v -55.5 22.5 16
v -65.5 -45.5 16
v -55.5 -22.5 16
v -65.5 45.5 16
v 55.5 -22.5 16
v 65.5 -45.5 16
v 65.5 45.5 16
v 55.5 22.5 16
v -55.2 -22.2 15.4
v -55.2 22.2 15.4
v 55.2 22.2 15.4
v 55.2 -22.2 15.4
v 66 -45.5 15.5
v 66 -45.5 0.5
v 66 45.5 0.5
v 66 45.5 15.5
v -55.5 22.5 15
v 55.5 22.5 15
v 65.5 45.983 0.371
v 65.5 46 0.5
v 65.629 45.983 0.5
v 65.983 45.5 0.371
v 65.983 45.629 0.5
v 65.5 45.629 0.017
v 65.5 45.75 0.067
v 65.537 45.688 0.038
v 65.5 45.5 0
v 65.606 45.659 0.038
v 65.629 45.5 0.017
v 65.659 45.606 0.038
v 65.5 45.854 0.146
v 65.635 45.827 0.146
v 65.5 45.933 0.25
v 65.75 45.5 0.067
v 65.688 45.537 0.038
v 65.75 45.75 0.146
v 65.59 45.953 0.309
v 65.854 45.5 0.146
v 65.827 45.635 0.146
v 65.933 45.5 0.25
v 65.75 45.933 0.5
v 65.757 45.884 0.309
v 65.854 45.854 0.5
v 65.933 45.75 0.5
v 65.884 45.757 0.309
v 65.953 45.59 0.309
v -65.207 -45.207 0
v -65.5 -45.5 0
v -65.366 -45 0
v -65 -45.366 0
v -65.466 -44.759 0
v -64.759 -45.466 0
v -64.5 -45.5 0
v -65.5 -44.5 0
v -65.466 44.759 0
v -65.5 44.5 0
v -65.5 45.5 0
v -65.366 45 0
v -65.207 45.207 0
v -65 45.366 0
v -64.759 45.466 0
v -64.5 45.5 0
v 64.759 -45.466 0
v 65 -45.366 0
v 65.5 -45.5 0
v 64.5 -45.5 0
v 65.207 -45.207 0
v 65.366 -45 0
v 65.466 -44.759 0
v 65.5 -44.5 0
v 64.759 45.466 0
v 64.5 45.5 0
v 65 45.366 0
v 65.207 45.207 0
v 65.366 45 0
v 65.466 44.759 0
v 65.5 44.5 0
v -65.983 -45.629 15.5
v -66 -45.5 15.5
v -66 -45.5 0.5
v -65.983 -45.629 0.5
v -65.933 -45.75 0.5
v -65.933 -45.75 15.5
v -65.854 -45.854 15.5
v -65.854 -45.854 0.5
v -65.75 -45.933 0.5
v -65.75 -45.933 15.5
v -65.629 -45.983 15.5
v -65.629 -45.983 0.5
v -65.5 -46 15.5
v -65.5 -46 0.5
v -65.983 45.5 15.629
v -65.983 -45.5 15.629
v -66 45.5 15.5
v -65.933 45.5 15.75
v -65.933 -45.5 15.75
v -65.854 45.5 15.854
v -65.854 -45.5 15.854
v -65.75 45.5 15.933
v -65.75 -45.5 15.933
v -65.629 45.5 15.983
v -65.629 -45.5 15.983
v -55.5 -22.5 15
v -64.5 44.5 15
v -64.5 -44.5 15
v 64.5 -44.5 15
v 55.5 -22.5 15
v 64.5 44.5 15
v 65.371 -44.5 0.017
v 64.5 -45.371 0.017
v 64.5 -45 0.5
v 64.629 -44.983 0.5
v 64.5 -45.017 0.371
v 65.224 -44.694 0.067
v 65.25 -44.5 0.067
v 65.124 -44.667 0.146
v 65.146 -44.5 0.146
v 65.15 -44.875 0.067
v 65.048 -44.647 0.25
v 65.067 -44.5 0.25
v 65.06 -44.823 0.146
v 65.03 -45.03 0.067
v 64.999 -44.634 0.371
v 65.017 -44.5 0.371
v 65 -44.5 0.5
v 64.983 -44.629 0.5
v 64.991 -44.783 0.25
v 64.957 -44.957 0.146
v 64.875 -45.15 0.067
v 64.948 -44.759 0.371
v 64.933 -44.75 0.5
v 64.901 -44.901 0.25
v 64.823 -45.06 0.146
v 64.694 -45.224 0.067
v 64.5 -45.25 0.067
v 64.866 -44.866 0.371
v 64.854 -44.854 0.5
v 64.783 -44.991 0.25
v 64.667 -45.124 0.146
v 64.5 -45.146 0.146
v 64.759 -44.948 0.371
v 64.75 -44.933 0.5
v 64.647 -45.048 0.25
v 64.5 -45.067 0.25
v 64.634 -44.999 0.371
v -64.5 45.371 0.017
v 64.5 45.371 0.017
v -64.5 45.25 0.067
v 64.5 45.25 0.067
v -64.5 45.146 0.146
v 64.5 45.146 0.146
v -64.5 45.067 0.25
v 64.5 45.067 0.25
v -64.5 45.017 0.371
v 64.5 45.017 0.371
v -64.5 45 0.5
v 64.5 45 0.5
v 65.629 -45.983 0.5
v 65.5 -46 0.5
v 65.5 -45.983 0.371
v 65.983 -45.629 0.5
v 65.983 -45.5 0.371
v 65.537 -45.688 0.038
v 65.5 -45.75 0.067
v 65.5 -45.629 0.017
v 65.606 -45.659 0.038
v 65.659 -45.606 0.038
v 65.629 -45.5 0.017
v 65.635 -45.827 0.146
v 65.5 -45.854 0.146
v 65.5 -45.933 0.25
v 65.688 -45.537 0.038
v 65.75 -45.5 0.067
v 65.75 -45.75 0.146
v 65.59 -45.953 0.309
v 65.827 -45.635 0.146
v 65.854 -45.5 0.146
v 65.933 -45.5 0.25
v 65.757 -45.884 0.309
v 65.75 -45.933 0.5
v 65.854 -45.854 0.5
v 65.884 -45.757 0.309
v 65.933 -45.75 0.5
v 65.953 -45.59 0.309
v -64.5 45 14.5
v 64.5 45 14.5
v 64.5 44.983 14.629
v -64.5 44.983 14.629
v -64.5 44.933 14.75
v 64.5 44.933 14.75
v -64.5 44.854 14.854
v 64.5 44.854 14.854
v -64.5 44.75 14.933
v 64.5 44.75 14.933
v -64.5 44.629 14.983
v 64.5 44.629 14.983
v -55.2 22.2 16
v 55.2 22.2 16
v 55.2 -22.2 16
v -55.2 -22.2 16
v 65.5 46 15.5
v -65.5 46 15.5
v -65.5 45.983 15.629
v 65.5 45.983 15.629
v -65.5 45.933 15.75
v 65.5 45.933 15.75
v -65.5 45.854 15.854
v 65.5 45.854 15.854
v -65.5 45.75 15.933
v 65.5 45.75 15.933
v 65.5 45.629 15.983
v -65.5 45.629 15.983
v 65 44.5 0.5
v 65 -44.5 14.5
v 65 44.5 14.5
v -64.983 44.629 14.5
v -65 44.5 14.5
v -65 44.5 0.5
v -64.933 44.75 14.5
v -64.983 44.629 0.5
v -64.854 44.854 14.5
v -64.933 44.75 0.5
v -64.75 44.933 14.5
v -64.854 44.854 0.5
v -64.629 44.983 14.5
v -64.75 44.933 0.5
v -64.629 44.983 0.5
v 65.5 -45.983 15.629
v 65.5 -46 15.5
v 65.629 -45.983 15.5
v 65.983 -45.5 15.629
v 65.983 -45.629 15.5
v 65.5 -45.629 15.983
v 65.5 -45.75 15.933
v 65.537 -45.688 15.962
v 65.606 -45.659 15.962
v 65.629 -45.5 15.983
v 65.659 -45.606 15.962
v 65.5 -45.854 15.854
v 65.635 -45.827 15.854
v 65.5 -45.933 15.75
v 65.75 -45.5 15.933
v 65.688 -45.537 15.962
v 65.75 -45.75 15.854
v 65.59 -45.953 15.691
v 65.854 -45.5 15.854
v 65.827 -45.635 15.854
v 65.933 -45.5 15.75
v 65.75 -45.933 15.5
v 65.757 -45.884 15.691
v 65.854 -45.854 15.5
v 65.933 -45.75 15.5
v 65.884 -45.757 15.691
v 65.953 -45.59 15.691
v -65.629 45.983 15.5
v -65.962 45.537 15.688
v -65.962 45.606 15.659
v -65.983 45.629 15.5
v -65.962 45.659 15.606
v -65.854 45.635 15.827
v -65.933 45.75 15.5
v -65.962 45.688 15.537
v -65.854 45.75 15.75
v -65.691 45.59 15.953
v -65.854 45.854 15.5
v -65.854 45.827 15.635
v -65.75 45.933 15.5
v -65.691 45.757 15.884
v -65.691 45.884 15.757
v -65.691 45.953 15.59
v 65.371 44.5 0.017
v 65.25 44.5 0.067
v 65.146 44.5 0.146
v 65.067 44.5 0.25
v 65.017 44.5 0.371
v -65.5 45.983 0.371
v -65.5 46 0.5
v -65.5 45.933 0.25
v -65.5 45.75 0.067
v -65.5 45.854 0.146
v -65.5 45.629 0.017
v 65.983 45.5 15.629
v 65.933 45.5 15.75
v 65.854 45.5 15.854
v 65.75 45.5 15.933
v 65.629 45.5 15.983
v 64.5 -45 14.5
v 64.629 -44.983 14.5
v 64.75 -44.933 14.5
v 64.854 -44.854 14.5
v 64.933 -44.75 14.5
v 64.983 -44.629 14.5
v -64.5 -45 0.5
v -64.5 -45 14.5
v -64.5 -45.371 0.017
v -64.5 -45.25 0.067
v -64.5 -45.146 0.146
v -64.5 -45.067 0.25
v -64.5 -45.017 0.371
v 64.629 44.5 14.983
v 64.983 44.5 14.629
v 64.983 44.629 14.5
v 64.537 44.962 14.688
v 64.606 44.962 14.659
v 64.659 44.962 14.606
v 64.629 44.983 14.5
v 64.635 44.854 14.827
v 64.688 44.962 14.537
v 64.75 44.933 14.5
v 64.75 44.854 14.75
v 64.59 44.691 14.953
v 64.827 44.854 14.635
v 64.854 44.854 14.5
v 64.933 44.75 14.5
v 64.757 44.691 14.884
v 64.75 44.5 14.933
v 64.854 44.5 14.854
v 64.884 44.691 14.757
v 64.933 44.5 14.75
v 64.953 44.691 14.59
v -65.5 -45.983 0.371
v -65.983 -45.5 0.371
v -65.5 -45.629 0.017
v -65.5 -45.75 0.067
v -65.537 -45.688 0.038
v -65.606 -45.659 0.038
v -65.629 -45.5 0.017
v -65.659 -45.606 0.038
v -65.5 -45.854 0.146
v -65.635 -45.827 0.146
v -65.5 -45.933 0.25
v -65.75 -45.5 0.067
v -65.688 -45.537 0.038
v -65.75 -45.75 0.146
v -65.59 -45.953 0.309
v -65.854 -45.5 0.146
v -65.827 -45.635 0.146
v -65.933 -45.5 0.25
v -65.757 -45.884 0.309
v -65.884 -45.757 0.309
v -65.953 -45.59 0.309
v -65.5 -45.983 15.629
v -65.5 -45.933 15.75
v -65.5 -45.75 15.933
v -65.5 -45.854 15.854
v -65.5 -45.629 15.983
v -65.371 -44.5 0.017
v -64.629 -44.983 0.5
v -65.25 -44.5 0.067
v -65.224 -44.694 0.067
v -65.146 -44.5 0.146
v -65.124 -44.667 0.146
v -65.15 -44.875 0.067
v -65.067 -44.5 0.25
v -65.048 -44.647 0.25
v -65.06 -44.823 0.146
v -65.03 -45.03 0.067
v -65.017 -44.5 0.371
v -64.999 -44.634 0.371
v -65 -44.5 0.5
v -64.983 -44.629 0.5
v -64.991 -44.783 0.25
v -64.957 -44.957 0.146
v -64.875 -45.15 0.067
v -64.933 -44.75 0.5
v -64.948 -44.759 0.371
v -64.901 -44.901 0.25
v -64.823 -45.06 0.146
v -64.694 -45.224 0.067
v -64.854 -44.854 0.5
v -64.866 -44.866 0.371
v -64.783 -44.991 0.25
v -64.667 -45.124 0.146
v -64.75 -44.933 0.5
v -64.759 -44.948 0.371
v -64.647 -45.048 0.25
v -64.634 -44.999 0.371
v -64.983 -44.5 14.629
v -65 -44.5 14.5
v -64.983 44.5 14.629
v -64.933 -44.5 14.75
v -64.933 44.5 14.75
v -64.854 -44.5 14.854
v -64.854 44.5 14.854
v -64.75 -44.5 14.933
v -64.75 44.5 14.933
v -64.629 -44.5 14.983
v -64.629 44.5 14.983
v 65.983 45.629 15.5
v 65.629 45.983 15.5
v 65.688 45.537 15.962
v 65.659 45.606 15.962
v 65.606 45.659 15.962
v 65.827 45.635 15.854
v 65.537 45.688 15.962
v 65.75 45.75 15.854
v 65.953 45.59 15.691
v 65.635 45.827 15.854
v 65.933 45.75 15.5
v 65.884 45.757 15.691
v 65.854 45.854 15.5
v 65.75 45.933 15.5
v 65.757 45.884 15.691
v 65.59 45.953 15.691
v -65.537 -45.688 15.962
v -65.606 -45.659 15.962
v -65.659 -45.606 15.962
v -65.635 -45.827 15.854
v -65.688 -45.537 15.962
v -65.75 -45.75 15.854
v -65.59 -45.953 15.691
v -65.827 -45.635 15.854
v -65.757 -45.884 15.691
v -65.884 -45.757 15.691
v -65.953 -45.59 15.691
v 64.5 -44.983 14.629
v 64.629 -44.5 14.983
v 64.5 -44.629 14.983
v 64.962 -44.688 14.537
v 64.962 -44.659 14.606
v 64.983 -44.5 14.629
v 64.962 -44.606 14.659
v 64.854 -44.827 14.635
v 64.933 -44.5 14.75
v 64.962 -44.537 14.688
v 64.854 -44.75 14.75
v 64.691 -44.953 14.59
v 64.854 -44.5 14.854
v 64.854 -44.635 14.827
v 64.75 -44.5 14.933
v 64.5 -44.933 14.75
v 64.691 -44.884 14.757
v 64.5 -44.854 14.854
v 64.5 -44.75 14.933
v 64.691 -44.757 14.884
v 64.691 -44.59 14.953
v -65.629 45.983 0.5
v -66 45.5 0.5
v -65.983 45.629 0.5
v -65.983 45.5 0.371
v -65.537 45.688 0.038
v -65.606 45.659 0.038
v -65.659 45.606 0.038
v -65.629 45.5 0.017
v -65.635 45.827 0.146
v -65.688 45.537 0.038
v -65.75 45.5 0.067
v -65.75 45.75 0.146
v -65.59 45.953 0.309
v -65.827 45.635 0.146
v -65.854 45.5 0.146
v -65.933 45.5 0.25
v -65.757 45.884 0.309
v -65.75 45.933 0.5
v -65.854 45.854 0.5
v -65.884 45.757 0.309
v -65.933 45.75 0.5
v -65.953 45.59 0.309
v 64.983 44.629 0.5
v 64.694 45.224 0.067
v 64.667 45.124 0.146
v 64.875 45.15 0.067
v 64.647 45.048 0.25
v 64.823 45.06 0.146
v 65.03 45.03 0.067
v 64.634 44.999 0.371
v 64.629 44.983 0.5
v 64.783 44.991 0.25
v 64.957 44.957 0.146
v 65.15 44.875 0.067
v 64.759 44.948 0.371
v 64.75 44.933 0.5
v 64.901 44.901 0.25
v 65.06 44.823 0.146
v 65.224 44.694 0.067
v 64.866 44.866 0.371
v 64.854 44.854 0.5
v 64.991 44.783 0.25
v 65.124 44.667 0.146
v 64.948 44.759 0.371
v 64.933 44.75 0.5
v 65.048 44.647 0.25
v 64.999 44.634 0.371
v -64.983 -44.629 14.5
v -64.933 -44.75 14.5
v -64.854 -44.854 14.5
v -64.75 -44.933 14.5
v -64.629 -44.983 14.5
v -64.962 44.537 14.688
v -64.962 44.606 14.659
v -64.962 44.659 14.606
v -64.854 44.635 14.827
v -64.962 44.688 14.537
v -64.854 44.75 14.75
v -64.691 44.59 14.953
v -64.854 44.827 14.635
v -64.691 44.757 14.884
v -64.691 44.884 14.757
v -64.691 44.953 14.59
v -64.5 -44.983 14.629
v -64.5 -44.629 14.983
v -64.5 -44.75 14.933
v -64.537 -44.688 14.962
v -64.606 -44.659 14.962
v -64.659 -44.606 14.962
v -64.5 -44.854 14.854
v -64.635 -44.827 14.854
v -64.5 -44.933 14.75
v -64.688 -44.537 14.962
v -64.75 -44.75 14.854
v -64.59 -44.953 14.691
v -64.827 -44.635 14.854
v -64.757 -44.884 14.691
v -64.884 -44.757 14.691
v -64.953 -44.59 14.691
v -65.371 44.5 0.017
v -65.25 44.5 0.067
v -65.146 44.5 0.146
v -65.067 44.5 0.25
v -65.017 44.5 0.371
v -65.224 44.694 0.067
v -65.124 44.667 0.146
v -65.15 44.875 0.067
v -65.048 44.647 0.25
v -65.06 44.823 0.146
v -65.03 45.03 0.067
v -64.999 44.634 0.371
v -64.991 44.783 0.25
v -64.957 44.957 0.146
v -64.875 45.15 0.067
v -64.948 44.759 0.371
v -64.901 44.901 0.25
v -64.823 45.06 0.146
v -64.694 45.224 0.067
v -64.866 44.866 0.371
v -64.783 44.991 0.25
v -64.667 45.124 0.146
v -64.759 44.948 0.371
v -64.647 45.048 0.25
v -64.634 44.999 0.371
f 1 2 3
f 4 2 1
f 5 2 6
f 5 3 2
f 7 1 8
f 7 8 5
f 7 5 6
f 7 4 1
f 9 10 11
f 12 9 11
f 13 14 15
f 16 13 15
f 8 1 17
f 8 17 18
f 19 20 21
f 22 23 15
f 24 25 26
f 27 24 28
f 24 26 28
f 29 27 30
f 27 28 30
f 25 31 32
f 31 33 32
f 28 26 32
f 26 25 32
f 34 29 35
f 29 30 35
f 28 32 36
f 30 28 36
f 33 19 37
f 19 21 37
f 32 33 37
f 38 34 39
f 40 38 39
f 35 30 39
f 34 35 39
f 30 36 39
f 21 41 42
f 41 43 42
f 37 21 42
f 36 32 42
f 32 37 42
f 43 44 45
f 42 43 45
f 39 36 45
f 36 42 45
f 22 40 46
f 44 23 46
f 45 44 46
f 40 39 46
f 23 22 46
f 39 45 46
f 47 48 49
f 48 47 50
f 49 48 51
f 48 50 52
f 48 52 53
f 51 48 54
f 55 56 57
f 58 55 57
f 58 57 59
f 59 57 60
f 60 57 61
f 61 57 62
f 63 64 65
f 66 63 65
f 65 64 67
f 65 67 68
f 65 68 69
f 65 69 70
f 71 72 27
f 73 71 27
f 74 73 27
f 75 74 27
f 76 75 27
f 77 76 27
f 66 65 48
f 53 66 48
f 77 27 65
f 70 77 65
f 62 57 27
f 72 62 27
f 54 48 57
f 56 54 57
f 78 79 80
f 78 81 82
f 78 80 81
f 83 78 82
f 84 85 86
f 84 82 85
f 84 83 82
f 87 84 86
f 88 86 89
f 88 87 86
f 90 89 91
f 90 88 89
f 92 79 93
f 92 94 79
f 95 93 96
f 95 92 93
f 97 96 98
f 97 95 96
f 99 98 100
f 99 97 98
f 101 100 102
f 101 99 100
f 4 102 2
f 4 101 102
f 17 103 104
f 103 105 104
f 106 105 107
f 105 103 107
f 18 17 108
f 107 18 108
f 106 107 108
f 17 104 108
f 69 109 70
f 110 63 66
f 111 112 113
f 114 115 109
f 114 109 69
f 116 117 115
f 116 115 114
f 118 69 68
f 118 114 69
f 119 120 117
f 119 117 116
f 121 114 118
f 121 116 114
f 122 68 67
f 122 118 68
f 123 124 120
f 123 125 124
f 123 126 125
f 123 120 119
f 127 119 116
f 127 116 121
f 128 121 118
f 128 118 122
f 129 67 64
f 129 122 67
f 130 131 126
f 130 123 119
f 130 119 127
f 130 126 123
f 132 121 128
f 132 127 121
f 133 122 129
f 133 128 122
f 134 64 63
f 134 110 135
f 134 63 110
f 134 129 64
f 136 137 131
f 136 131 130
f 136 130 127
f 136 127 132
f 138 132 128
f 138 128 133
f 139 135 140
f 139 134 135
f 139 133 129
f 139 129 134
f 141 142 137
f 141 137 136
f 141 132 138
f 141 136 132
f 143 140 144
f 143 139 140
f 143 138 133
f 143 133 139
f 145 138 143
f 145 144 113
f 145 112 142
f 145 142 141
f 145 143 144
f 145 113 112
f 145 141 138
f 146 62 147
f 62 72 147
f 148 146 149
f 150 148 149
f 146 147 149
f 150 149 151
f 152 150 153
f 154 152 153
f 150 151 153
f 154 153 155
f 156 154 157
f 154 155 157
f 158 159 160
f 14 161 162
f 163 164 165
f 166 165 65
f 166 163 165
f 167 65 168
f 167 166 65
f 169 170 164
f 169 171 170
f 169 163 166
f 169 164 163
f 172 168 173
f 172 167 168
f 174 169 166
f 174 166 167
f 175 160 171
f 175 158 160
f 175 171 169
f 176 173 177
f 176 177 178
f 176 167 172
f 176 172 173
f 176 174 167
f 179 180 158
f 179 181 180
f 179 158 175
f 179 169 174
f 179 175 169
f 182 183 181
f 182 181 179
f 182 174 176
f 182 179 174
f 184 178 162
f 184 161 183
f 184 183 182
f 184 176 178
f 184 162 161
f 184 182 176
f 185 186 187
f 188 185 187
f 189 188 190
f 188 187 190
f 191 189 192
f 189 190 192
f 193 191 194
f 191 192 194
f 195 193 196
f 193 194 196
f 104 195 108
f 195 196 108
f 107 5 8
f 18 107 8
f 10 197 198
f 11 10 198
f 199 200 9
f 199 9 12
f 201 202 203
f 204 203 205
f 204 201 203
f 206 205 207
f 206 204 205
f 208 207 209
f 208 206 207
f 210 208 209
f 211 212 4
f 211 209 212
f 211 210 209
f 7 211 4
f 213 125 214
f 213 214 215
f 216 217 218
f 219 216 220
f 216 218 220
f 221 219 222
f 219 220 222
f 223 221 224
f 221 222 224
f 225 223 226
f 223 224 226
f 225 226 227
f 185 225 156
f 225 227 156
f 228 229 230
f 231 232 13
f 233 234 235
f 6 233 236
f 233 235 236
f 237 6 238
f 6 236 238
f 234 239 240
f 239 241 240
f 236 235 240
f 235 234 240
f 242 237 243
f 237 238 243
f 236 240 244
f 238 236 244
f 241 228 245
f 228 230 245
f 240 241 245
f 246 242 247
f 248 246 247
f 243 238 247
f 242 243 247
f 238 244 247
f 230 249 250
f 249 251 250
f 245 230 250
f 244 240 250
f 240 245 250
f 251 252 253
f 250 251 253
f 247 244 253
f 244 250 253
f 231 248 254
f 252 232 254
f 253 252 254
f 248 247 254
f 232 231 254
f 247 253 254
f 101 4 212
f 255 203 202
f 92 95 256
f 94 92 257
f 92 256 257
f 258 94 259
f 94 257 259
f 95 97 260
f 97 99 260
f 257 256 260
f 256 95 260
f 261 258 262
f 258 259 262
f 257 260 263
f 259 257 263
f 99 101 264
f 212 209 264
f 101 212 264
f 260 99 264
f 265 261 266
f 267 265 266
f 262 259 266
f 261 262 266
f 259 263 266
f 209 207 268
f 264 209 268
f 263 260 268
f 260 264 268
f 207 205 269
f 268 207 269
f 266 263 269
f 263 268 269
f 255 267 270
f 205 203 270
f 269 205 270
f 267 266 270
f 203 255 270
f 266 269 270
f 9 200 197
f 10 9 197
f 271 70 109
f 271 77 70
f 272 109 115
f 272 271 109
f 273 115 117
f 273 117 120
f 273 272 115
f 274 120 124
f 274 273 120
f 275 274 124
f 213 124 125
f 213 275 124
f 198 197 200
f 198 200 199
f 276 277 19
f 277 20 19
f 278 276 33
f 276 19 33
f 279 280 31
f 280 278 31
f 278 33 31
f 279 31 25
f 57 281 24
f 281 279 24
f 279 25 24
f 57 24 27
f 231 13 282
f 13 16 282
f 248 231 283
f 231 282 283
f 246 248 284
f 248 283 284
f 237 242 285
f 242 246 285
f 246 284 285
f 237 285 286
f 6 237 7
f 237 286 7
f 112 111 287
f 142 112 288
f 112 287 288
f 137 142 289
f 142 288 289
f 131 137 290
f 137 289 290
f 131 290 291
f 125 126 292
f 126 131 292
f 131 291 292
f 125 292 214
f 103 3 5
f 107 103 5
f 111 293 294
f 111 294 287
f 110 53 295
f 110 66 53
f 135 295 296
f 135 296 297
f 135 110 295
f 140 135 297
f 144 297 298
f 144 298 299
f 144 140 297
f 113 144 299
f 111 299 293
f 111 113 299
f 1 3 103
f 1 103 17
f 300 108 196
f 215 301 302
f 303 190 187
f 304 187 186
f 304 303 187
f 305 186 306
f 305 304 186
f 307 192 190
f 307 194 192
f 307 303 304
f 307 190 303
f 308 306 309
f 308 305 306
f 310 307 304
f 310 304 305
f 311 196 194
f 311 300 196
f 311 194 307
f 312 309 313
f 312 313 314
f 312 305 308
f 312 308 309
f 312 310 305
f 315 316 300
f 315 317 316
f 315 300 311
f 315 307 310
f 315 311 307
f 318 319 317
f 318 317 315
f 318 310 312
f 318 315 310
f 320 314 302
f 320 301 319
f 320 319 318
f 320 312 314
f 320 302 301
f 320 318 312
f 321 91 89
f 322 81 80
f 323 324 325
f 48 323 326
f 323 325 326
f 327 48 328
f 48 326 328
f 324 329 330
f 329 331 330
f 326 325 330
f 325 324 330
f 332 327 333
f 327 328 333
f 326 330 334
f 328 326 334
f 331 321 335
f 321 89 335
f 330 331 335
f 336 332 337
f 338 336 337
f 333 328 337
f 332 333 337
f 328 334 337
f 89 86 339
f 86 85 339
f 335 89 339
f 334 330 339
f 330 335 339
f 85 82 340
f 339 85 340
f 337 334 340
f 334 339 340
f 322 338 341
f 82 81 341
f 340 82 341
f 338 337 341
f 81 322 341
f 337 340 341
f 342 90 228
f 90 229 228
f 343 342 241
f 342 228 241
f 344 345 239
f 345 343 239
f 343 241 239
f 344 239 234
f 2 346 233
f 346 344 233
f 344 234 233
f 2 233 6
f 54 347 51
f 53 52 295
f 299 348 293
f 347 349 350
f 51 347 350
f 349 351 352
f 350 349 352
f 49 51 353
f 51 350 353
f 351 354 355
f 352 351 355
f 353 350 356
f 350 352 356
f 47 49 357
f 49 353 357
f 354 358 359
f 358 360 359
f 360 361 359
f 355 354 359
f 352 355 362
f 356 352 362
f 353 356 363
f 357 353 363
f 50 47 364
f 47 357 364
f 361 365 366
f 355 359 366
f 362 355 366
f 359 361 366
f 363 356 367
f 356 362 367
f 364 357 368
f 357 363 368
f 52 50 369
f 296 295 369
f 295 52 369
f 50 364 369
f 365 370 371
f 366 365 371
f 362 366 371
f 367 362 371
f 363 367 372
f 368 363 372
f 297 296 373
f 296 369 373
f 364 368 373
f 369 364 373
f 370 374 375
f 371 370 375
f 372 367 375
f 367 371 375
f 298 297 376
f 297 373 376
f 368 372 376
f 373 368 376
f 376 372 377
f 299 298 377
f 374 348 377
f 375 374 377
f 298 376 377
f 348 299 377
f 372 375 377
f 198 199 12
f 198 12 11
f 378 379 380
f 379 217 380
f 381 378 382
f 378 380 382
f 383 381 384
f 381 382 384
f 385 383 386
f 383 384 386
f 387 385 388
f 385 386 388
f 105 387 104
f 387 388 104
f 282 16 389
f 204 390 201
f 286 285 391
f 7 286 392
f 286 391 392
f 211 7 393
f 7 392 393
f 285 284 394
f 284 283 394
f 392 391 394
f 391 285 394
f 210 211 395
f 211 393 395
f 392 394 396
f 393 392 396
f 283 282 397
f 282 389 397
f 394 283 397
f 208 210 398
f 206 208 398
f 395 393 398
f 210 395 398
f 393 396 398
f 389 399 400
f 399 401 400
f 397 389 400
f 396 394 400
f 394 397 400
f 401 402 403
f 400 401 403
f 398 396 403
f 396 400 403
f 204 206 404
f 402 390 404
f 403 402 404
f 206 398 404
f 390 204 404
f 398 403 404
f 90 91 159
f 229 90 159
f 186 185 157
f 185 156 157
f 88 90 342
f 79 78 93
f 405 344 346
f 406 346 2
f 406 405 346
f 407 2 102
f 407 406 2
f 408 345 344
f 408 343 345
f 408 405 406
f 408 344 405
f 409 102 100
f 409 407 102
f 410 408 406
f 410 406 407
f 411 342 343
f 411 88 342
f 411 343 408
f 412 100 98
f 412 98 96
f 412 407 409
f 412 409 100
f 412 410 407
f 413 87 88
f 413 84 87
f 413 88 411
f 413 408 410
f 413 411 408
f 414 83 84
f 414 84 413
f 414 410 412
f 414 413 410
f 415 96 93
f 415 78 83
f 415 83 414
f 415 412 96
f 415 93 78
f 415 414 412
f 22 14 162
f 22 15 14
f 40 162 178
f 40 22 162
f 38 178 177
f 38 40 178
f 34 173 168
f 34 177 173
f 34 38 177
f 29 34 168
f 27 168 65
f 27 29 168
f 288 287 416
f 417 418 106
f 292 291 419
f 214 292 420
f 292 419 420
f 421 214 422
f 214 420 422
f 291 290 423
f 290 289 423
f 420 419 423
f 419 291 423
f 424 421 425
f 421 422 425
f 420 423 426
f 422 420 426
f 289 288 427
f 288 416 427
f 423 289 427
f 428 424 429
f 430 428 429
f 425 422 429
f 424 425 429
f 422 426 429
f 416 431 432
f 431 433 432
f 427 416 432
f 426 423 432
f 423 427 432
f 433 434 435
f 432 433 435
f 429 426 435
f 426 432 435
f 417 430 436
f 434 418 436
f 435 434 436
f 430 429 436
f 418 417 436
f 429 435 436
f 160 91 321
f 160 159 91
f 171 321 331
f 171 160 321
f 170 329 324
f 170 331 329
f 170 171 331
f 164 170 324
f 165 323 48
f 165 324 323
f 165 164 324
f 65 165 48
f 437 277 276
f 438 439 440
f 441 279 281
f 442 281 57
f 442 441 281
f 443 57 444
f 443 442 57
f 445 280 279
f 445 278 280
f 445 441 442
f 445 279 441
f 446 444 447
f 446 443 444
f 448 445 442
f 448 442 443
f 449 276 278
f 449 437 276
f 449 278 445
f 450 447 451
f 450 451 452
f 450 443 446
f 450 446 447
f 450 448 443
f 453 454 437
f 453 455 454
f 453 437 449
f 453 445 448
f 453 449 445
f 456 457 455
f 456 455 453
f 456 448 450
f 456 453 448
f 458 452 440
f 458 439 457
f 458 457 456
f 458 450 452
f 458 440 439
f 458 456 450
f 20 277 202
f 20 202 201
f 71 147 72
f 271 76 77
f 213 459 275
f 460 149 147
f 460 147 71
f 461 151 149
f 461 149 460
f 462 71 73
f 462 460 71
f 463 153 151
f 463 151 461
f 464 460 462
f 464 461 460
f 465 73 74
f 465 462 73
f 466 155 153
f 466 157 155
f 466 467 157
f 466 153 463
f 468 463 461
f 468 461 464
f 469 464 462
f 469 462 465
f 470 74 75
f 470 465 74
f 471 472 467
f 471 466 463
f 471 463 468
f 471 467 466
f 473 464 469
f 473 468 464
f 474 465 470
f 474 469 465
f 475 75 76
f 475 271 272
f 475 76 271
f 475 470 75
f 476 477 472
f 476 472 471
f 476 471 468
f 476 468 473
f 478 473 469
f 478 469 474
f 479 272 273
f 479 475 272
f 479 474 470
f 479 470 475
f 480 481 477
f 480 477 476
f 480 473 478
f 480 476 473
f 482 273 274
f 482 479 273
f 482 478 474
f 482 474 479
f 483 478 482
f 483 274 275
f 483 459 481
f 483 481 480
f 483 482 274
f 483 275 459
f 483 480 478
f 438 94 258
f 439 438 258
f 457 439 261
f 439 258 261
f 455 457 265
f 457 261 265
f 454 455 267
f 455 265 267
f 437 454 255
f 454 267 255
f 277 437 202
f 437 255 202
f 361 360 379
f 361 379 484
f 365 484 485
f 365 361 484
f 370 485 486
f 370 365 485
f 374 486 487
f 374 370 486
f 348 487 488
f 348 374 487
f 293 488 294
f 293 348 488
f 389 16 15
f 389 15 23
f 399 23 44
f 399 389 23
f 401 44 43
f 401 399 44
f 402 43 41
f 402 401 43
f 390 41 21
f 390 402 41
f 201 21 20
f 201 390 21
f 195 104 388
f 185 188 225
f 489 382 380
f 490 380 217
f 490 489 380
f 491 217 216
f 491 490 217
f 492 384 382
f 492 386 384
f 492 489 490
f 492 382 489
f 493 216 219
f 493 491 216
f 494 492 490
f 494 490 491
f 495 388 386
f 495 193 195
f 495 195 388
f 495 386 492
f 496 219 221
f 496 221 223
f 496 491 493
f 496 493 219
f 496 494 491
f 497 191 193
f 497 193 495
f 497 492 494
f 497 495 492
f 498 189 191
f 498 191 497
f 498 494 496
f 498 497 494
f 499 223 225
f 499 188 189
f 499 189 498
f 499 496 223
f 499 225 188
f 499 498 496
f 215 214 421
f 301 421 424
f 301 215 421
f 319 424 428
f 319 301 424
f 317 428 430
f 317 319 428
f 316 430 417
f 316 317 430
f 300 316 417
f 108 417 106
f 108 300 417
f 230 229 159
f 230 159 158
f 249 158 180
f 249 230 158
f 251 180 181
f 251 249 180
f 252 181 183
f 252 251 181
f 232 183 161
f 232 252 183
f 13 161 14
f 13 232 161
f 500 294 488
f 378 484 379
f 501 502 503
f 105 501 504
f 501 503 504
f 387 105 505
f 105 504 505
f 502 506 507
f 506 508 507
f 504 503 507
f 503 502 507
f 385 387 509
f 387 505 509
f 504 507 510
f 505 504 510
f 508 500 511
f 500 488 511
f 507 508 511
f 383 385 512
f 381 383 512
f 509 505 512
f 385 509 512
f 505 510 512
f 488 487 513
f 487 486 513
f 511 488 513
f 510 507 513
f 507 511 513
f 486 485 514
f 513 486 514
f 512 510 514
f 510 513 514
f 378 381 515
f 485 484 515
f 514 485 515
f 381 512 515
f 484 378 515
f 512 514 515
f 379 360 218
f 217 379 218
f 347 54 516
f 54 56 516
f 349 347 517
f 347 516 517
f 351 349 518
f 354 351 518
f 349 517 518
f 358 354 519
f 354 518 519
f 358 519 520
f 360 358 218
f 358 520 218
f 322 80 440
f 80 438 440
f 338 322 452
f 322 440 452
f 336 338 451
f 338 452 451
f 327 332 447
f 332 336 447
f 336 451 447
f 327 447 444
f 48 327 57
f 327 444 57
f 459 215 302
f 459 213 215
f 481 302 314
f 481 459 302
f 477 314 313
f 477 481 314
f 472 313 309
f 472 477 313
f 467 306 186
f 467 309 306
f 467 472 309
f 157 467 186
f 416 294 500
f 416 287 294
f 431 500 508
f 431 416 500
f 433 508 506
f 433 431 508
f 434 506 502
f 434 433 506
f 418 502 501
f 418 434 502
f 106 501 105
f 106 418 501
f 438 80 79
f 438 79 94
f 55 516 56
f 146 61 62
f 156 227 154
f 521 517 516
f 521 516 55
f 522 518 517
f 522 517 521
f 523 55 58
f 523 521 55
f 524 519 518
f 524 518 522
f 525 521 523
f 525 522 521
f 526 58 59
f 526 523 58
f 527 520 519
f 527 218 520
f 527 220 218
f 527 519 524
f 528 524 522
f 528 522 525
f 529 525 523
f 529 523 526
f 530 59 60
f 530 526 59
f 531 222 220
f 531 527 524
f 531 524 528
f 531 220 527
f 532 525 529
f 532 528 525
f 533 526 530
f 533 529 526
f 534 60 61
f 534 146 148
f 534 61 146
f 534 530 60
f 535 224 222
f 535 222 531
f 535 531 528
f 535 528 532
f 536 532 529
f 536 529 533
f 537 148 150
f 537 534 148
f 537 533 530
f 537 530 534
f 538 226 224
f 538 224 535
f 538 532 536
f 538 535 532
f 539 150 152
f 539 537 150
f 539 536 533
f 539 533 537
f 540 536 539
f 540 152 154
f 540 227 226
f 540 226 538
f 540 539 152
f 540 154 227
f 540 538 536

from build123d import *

# Parameters (mm, degrees)
F0_W     = 132
F0_H     = 92
F1_DEPTH = 16
F2_T     = -1
F3_R     = 0.49999
F4_W     = 111
F4_H     = 45
F5_DEPTH = 2
F6_W     = 110.3999990821
F6_H     = 44.3999990821
F7_DEPTH = 0.6


# Not quite as in the source:
# - a fillet or chamfer is up to 0.001 mm smaller than in the source, because OpenCascade refuses the exact size


with BuildPart() as f1:
    # F0 (on Top) → F1 (new body)
    with BuildSketch(Plane.XY):
        Rectangle(F0_W, F0_H)
    extrude(amount=F1_DEPTH)

    # F2
    f2_openings = [f1.faces().sort_by_distance(p)[0] for p in [
        (0, 0, 0),
    ]]
    offset(amount=F2_T, openings=f2_openings)

    # F3 (radius 0.5 in the source; OpenCascade refuses exactly that, so slightly less here)
    f3_edges = [f1.edges().sort_by_distance(p)[0] for p in [
        (66, -46, 8),
        (-66, -46, 8),
        (0, -46, 0),
        (0, -46, 16),
        (66, 46, 8),
        (66, 0, 16),
        (0, 46, 16),
        (-66, 0, 16),
        (-66, 46, 8),
        (0, 46, 0),
        (66, 0, 0),
        (-66, 0, 0),
        (0, -45, 0),
        (-65, -45, 7.5),
        (0, -45, 15),
        (65, -45, 7.5),
        (65, 0, 15),
        (0, 45, 15),
        (-65, 0, 15),
        (65, 45, 7.5),
        (0, 45, 0),
        (-65, 45, 7.5),
        (65, 0, 0),
        (-65, 0, 0),
    ]]
    fillet(f3_edges, radius=F3_R)

    # F4 (on face) → F5 (cut)
    with BuildSketch(Plane.XY.offset(16)):
        Rectangle(F4_W, F4_H)
    extrude(amount=-F5_DEPTH, mode=Mode.SUBTRACT)


with BuildPart() as f7:
    # F6 (on face) → F7 (new body)
    with BuildSketch(Plane.XY.offset(16)):
        Rectangle(F6_W, F6_H)
    extrude(amount=-F7_DEPTH)


solid = Compound([f1.part, f7.part])
